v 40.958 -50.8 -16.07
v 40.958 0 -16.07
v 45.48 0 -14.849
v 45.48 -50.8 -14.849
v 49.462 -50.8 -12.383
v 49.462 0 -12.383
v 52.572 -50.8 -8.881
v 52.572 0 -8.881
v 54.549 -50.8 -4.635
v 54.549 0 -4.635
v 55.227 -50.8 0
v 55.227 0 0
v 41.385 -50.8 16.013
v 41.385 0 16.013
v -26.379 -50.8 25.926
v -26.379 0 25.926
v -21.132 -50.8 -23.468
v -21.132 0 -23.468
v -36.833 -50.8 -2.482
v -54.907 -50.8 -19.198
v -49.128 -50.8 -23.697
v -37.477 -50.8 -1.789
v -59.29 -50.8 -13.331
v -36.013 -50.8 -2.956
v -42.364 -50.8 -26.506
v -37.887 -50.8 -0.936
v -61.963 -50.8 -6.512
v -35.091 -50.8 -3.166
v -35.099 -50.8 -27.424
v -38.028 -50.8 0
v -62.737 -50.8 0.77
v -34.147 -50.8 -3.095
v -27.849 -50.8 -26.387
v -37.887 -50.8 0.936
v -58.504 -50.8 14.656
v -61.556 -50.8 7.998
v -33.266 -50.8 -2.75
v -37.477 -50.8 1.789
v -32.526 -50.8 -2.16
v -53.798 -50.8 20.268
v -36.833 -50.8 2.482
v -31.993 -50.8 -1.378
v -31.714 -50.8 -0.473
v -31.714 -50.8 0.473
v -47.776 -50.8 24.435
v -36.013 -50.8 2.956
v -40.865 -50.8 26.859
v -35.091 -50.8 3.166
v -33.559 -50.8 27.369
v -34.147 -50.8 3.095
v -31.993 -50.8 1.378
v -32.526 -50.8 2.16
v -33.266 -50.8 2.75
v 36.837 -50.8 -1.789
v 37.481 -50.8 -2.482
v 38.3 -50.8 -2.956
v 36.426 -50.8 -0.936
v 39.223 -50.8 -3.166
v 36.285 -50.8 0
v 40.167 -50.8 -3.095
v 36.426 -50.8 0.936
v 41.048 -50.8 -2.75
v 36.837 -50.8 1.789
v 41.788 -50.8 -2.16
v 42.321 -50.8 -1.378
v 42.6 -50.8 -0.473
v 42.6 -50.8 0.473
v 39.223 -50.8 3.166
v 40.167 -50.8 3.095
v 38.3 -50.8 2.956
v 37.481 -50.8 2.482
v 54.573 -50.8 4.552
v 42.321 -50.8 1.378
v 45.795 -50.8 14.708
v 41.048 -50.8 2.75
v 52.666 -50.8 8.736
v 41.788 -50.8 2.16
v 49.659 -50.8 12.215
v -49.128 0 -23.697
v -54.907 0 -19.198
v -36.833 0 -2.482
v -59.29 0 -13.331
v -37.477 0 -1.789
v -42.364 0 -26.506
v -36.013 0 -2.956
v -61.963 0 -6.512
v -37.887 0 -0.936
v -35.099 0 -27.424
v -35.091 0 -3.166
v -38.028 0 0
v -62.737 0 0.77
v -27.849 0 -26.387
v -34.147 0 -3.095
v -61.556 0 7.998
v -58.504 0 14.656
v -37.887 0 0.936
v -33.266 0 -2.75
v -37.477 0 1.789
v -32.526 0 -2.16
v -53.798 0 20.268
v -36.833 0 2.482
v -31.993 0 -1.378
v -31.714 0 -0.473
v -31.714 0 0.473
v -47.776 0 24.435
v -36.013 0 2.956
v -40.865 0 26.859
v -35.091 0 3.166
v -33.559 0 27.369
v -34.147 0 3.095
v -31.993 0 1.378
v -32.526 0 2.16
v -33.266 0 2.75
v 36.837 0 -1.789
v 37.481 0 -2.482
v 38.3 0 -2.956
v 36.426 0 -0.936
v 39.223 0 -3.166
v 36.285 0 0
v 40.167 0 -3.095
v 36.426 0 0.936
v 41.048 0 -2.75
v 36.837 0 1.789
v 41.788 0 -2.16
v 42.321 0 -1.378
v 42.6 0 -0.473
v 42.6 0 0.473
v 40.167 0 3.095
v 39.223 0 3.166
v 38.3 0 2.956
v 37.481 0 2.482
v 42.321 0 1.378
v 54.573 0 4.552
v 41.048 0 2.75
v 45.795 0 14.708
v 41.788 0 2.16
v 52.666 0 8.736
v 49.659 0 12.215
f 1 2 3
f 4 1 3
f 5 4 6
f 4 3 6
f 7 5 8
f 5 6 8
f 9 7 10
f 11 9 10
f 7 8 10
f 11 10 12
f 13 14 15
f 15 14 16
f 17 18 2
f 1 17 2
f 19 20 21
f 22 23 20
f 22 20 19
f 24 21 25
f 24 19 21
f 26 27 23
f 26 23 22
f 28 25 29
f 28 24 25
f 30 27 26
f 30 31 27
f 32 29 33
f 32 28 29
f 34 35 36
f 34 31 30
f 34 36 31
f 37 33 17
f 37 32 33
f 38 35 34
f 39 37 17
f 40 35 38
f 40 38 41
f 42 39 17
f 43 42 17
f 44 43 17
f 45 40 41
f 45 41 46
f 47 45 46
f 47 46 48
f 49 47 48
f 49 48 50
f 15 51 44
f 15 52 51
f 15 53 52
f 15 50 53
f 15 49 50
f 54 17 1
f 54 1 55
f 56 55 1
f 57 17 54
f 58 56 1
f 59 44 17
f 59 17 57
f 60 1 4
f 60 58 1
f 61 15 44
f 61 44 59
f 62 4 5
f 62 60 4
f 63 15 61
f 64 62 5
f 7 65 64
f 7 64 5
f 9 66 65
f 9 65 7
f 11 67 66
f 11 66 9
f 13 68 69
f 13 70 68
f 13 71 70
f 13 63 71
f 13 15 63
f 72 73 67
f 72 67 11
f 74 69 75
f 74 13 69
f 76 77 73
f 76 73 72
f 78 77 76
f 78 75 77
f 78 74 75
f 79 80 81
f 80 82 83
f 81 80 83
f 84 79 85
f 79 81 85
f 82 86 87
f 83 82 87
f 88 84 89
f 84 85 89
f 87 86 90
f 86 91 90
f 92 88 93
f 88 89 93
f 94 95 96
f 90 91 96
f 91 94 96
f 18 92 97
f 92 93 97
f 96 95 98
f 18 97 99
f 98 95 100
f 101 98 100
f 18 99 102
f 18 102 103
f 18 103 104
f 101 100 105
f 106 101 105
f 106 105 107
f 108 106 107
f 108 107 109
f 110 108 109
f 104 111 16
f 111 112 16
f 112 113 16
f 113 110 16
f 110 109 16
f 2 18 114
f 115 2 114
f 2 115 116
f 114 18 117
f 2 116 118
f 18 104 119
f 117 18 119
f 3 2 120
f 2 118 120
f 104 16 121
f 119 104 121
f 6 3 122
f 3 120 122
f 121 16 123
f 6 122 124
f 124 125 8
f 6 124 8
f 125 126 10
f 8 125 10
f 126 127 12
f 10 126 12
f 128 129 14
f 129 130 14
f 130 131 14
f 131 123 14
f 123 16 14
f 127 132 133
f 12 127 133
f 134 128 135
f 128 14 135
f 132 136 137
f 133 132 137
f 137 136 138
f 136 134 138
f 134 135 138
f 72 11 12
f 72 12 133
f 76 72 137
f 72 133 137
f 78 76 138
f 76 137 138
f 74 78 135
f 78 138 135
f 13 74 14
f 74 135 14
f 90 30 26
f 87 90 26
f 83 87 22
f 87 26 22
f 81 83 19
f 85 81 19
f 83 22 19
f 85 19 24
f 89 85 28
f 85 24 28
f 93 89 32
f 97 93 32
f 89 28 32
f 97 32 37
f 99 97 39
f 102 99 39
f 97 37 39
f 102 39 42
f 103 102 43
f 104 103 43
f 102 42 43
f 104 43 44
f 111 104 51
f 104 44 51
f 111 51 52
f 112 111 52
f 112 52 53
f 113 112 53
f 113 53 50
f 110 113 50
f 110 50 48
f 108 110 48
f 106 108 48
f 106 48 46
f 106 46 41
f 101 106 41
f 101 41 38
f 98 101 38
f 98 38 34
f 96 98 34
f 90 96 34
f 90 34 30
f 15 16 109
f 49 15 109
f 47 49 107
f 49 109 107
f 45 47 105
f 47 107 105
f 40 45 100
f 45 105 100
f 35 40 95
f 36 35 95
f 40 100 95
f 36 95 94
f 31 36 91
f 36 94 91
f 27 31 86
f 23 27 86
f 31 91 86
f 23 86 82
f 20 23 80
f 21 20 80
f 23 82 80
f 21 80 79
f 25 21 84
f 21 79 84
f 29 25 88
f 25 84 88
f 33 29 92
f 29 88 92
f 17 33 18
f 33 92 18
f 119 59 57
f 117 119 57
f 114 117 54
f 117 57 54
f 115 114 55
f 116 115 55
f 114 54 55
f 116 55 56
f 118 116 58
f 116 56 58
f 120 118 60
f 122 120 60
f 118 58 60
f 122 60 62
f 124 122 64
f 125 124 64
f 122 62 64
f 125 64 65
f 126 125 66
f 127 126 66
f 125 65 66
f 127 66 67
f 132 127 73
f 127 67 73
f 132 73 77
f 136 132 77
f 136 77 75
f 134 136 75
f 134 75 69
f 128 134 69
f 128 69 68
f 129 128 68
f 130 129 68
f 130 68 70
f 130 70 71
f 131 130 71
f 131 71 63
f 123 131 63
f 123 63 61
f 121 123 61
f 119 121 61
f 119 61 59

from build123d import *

# Parameters (mm, degrees)
F2_DEPTH = 50.8
F3_D     = 6.35


with BuildPart() as f2:
    # F0 (on Front) → F2 (new body)
    with BuildSketch(Plane.XZ):
        with BuildLine():
            ThreePointArc((-21.131788, -23.46847), (-11.433926, -13.47147), (-7.897254, 0))
            ThreePointArc((-7.897254, 0), (-12.99061, 15.919526), (-26.378829, 25.925983))
            ThreePointArc((-26.378829, 25.925983), (-62.594401, -2.897016), (-21.131788, -23.46847))
        make_face()
        with BuildLine():
            ThreePointArc((-26.378829, 25.925983), (-12.99061, 15.919526), (-7.897254, 0))
            ThreePointArc((-7.897254, 0), (-11.433926, -13.47147), (-21.131788, -23.46847))
            Line((-21.131788, -23.46847), (40.957866, -16.070068))
            ThreePointArc((40.957866, -16.070068), (22.860697, 0.215672), (41.385461, 16.013328))
            Line((41.385461, 16.013328), (-26.378829, 25.925983))
        make_face()
        with BuildLine():
            ThreePointArc((55.226759, 0), (51.286853, 10.583102), (41.385461, 16.013328))
            ThreePointArc((41.385461, 16.013328), (22.860697, 0.215672), (40.957866, -16.070068))
            ThreePointArc((40.957866, -16.070068), (51.144731, -10.745329), (55.226759, 0))
        make_face()
    extrude(amount=F2_DEPTH)

    # F3 (through all)
    with Locations(Plane(origin=(0, 0, 0), x_dir=(1, 0, 0), z_dir=(0, 1, 0))):
        with Locations((-34.853246, 0), (39.460354, 0)):
            Hole(F3_D / 2)


solid = f2.part
